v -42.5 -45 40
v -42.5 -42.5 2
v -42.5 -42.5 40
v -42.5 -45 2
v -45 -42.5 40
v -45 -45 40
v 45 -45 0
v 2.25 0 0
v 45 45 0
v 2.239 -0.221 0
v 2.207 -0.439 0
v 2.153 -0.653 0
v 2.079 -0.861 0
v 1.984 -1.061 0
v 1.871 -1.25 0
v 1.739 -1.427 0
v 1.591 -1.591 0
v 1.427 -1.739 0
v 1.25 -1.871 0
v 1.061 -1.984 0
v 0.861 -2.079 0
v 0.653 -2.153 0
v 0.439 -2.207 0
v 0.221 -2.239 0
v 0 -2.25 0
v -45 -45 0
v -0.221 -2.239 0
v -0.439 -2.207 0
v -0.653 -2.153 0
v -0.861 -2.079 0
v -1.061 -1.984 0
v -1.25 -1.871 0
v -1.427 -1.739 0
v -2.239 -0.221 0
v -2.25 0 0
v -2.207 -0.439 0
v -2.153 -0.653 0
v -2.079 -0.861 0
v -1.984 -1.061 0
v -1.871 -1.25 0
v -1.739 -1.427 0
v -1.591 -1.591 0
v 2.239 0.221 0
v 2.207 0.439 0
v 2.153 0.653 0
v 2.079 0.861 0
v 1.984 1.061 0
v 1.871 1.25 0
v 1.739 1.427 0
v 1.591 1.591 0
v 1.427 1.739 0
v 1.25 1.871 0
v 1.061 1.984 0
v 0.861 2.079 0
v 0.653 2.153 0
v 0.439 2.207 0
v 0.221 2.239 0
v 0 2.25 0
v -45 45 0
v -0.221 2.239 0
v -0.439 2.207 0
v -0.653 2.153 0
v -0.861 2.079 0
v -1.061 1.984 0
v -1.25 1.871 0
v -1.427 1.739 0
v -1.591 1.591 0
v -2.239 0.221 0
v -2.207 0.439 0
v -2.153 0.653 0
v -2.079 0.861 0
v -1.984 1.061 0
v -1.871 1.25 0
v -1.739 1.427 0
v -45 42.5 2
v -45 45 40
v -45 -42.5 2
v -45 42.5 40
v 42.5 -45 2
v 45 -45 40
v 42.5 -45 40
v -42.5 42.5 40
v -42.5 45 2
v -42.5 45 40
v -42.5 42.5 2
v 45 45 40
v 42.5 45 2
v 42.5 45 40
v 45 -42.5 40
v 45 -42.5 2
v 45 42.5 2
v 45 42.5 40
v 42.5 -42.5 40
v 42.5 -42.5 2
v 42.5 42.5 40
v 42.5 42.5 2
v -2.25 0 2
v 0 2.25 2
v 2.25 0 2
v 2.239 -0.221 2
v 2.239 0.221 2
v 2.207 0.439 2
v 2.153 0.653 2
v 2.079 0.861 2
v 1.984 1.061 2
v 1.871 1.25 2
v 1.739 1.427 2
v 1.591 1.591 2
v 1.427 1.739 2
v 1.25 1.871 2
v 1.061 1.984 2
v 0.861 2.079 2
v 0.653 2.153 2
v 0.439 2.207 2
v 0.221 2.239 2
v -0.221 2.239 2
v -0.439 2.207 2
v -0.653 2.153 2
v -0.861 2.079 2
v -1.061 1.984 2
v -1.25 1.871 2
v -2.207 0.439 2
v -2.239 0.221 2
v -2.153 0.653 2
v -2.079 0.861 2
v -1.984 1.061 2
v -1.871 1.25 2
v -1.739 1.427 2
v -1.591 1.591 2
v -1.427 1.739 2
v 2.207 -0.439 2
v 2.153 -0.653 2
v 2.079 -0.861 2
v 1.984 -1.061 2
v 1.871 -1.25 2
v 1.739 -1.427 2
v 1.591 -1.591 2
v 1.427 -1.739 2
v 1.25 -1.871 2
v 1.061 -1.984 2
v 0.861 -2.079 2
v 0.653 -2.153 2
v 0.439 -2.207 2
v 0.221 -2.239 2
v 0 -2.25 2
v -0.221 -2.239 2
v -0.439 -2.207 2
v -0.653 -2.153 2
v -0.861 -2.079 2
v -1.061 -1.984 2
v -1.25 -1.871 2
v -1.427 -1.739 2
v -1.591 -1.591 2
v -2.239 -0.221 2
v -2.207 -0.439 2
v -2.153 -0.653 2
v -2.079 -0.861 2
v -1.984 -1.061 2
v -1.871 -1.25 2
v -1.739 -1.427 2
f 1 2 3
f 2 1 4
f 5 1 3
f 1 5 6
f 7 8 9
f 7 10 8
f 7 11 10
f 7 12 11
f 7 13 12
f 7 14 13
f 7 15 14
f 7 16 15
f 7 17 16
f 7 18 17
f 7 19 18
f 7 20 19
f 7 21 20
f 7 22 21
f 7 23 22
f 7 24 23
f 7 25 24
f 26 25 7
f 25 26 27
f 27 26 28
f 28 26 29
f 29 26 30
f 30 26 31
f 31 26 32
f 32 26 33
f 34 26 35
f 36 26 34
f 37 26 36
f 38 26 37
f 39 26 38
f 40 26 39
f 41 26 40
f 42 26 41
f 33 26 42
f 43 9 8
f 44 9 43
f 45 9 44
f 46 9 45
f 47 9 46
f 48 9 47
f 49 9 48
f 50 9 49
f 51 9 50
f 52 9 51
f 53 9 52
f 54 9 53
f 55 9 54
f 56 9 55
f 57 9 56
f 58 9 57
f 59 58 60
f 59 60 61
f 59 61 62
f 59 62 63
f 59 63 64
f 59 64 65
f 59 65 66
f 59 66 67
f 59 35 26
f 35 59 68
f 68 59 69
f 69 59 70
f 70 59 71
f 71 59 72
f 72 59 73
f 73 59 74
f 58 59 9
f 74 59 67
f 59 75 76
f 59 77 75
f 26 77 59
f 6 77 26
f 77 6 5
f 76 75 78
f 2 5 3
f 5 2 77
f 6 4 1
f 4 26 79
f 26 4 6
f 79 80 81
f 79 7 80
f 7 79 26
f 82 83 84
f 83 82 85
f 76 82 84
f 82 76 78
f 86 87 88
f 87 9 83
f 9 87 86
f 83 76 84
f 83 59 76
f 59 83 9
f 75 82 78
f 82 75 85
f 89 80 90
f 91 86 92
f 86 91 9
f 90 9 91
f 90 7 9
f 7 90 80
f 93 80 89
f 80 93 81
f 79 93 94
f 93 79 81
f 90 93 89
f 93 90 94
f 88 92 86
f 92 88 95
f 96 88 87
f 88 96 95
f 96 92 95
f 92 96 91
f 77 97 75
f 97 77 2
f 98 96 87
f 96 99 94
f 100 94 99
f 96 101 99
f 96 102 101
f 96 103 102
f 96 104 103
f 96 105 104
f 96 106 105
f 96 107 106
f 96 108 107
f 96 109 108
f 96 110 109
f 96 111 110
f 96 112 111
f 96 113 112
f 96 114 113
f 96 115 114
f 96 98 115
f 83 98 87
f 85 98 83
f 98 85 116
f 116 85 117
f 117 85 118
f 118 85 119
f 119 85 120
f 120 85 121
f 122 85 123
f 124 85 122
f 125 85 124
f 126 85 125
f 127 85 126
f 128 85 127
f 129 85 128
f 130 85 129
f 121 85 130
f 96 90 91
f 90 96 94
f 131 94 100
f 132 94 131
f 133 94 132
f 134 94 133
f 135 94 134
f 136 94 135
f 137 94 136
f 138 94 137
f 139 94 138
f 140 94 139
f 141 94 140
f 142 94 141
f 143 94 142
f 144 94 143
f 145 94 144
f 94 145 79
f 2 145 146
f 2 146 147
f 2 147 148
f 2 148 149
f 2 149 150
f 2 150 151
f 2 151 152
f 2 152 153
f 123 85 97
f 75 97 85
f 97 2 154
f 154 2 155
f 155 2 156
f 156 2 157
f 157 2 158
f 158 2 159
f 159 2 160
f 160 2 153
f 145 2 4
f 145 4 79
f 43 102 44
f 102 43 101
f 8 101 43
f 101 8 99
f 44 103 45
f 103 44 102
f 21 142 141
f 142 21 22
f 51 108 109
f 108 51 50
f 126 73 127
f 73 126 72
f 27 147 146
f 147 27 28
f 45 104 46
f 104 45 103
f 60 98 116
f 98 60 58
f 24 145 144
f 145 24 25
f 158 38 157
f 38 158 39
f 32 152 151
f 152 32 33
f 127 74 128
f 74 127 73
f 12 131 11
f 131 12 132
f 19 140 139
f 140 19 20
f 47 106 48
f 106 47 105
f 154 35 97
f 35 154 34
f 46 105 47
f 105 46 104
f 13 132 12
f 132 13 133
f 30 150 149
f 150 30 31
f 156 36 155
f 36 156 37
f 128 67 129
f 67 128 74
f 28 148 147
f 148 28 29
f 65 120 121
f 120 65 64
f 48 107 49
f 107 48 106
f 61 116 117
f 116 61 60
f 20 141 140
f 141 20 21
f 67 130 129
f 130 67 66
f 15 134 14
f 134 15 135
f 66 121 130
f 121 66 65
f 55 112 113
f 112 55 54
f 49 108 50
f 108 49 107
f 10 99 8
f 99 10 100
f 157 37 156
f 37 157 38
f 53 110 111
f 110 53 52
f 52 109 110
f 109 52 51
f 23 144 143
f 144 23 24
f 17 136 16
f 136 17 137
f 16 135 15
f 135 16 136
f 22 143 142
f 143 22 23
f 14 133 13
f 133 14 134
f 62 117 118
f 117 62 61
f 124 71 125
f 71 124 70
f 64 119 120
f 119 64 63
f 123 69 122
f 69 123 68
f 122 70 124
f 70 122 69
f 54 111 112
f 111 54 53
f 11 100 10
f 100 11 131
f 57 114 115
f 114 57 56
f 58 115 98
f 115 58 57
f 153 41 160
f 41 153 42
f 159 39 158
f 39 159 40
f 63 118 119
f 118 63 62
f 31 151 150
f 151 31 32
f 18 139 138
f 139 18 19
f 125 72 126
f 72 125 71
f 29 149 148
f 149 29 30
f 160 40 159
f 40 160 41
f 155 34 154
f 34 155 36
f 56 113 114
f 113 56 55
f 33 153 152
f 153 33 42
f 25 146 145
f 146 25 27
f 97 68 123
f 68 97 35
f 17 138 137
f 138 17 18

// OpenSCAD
// DIY magnetic stirrer housing for 80 mm PC case fan
// Print orientation: top plate on bed (z = 0), walls build upward (+Z)

$fn = 64;

// ---- Dimensions (mm) ----
plate_t      = 2;     // top plate thickness
wall_t       = 2.5;   // wall thickness
box_h        = 40;    // total height of box (top of walls)
outer_x      = 90;    // outer size in X
outer_y      = 90;    // outer size in Y
hole_d       = 4.5;   // screw hole diameter (M4)
hole_pitch   = 71.5;  // square pattern pitch for screw holes
notch_w      = 12;    // cable notch width
notch_depth  = 8;     // cable notch depth from open edge (z = 32 to 40)
eps          = 0.5;   // cutter overshoot past faces

// ---- Model ----
difference() {
    union() {
        // Top plate
        translate([-outer_x / 2, -outer_y / 2, 0])
            cube([outer_x, outer_y, plate_t]);

        // Four walls, 90 x 90 outer, rising to z = box_h
        for (sx = [-1, 1], sy = [-1, 1])
            translate([sx > 0 ? outer_x / 2 - wall_t : -outer_x / 2,
                       sy > 0 ? outer_y / 2 - wall_t : -outer_y / 2,
                       0])
                cube([wall_t, wall_t, box_h]);
    }

    // Screw holes through top plate on 71.5 mm square pattern
    for (i = [0 : 3]) {
        x = -hole_pitch / 2 + (i - 1.5) * hole_pitch;
        y = -hole_pitch / 2 + (i - 1.5) * hole_pitch;
        translate([x, y, -eps])
            cylinder(d = hole_d, h = plate_t + 2 * eps);
    }

    // Cable notch in one wall: 12 mm wide, centred along wall,
    // from z = 32 to z = 40 (open edge is at z = box_h)
    translate([-outer_x / 2 - eps, -notch_w / 2, box_h - notch_depth])
        cube([notch_w + 2 * eps, wall_t, notch_depth + eps]);
}
